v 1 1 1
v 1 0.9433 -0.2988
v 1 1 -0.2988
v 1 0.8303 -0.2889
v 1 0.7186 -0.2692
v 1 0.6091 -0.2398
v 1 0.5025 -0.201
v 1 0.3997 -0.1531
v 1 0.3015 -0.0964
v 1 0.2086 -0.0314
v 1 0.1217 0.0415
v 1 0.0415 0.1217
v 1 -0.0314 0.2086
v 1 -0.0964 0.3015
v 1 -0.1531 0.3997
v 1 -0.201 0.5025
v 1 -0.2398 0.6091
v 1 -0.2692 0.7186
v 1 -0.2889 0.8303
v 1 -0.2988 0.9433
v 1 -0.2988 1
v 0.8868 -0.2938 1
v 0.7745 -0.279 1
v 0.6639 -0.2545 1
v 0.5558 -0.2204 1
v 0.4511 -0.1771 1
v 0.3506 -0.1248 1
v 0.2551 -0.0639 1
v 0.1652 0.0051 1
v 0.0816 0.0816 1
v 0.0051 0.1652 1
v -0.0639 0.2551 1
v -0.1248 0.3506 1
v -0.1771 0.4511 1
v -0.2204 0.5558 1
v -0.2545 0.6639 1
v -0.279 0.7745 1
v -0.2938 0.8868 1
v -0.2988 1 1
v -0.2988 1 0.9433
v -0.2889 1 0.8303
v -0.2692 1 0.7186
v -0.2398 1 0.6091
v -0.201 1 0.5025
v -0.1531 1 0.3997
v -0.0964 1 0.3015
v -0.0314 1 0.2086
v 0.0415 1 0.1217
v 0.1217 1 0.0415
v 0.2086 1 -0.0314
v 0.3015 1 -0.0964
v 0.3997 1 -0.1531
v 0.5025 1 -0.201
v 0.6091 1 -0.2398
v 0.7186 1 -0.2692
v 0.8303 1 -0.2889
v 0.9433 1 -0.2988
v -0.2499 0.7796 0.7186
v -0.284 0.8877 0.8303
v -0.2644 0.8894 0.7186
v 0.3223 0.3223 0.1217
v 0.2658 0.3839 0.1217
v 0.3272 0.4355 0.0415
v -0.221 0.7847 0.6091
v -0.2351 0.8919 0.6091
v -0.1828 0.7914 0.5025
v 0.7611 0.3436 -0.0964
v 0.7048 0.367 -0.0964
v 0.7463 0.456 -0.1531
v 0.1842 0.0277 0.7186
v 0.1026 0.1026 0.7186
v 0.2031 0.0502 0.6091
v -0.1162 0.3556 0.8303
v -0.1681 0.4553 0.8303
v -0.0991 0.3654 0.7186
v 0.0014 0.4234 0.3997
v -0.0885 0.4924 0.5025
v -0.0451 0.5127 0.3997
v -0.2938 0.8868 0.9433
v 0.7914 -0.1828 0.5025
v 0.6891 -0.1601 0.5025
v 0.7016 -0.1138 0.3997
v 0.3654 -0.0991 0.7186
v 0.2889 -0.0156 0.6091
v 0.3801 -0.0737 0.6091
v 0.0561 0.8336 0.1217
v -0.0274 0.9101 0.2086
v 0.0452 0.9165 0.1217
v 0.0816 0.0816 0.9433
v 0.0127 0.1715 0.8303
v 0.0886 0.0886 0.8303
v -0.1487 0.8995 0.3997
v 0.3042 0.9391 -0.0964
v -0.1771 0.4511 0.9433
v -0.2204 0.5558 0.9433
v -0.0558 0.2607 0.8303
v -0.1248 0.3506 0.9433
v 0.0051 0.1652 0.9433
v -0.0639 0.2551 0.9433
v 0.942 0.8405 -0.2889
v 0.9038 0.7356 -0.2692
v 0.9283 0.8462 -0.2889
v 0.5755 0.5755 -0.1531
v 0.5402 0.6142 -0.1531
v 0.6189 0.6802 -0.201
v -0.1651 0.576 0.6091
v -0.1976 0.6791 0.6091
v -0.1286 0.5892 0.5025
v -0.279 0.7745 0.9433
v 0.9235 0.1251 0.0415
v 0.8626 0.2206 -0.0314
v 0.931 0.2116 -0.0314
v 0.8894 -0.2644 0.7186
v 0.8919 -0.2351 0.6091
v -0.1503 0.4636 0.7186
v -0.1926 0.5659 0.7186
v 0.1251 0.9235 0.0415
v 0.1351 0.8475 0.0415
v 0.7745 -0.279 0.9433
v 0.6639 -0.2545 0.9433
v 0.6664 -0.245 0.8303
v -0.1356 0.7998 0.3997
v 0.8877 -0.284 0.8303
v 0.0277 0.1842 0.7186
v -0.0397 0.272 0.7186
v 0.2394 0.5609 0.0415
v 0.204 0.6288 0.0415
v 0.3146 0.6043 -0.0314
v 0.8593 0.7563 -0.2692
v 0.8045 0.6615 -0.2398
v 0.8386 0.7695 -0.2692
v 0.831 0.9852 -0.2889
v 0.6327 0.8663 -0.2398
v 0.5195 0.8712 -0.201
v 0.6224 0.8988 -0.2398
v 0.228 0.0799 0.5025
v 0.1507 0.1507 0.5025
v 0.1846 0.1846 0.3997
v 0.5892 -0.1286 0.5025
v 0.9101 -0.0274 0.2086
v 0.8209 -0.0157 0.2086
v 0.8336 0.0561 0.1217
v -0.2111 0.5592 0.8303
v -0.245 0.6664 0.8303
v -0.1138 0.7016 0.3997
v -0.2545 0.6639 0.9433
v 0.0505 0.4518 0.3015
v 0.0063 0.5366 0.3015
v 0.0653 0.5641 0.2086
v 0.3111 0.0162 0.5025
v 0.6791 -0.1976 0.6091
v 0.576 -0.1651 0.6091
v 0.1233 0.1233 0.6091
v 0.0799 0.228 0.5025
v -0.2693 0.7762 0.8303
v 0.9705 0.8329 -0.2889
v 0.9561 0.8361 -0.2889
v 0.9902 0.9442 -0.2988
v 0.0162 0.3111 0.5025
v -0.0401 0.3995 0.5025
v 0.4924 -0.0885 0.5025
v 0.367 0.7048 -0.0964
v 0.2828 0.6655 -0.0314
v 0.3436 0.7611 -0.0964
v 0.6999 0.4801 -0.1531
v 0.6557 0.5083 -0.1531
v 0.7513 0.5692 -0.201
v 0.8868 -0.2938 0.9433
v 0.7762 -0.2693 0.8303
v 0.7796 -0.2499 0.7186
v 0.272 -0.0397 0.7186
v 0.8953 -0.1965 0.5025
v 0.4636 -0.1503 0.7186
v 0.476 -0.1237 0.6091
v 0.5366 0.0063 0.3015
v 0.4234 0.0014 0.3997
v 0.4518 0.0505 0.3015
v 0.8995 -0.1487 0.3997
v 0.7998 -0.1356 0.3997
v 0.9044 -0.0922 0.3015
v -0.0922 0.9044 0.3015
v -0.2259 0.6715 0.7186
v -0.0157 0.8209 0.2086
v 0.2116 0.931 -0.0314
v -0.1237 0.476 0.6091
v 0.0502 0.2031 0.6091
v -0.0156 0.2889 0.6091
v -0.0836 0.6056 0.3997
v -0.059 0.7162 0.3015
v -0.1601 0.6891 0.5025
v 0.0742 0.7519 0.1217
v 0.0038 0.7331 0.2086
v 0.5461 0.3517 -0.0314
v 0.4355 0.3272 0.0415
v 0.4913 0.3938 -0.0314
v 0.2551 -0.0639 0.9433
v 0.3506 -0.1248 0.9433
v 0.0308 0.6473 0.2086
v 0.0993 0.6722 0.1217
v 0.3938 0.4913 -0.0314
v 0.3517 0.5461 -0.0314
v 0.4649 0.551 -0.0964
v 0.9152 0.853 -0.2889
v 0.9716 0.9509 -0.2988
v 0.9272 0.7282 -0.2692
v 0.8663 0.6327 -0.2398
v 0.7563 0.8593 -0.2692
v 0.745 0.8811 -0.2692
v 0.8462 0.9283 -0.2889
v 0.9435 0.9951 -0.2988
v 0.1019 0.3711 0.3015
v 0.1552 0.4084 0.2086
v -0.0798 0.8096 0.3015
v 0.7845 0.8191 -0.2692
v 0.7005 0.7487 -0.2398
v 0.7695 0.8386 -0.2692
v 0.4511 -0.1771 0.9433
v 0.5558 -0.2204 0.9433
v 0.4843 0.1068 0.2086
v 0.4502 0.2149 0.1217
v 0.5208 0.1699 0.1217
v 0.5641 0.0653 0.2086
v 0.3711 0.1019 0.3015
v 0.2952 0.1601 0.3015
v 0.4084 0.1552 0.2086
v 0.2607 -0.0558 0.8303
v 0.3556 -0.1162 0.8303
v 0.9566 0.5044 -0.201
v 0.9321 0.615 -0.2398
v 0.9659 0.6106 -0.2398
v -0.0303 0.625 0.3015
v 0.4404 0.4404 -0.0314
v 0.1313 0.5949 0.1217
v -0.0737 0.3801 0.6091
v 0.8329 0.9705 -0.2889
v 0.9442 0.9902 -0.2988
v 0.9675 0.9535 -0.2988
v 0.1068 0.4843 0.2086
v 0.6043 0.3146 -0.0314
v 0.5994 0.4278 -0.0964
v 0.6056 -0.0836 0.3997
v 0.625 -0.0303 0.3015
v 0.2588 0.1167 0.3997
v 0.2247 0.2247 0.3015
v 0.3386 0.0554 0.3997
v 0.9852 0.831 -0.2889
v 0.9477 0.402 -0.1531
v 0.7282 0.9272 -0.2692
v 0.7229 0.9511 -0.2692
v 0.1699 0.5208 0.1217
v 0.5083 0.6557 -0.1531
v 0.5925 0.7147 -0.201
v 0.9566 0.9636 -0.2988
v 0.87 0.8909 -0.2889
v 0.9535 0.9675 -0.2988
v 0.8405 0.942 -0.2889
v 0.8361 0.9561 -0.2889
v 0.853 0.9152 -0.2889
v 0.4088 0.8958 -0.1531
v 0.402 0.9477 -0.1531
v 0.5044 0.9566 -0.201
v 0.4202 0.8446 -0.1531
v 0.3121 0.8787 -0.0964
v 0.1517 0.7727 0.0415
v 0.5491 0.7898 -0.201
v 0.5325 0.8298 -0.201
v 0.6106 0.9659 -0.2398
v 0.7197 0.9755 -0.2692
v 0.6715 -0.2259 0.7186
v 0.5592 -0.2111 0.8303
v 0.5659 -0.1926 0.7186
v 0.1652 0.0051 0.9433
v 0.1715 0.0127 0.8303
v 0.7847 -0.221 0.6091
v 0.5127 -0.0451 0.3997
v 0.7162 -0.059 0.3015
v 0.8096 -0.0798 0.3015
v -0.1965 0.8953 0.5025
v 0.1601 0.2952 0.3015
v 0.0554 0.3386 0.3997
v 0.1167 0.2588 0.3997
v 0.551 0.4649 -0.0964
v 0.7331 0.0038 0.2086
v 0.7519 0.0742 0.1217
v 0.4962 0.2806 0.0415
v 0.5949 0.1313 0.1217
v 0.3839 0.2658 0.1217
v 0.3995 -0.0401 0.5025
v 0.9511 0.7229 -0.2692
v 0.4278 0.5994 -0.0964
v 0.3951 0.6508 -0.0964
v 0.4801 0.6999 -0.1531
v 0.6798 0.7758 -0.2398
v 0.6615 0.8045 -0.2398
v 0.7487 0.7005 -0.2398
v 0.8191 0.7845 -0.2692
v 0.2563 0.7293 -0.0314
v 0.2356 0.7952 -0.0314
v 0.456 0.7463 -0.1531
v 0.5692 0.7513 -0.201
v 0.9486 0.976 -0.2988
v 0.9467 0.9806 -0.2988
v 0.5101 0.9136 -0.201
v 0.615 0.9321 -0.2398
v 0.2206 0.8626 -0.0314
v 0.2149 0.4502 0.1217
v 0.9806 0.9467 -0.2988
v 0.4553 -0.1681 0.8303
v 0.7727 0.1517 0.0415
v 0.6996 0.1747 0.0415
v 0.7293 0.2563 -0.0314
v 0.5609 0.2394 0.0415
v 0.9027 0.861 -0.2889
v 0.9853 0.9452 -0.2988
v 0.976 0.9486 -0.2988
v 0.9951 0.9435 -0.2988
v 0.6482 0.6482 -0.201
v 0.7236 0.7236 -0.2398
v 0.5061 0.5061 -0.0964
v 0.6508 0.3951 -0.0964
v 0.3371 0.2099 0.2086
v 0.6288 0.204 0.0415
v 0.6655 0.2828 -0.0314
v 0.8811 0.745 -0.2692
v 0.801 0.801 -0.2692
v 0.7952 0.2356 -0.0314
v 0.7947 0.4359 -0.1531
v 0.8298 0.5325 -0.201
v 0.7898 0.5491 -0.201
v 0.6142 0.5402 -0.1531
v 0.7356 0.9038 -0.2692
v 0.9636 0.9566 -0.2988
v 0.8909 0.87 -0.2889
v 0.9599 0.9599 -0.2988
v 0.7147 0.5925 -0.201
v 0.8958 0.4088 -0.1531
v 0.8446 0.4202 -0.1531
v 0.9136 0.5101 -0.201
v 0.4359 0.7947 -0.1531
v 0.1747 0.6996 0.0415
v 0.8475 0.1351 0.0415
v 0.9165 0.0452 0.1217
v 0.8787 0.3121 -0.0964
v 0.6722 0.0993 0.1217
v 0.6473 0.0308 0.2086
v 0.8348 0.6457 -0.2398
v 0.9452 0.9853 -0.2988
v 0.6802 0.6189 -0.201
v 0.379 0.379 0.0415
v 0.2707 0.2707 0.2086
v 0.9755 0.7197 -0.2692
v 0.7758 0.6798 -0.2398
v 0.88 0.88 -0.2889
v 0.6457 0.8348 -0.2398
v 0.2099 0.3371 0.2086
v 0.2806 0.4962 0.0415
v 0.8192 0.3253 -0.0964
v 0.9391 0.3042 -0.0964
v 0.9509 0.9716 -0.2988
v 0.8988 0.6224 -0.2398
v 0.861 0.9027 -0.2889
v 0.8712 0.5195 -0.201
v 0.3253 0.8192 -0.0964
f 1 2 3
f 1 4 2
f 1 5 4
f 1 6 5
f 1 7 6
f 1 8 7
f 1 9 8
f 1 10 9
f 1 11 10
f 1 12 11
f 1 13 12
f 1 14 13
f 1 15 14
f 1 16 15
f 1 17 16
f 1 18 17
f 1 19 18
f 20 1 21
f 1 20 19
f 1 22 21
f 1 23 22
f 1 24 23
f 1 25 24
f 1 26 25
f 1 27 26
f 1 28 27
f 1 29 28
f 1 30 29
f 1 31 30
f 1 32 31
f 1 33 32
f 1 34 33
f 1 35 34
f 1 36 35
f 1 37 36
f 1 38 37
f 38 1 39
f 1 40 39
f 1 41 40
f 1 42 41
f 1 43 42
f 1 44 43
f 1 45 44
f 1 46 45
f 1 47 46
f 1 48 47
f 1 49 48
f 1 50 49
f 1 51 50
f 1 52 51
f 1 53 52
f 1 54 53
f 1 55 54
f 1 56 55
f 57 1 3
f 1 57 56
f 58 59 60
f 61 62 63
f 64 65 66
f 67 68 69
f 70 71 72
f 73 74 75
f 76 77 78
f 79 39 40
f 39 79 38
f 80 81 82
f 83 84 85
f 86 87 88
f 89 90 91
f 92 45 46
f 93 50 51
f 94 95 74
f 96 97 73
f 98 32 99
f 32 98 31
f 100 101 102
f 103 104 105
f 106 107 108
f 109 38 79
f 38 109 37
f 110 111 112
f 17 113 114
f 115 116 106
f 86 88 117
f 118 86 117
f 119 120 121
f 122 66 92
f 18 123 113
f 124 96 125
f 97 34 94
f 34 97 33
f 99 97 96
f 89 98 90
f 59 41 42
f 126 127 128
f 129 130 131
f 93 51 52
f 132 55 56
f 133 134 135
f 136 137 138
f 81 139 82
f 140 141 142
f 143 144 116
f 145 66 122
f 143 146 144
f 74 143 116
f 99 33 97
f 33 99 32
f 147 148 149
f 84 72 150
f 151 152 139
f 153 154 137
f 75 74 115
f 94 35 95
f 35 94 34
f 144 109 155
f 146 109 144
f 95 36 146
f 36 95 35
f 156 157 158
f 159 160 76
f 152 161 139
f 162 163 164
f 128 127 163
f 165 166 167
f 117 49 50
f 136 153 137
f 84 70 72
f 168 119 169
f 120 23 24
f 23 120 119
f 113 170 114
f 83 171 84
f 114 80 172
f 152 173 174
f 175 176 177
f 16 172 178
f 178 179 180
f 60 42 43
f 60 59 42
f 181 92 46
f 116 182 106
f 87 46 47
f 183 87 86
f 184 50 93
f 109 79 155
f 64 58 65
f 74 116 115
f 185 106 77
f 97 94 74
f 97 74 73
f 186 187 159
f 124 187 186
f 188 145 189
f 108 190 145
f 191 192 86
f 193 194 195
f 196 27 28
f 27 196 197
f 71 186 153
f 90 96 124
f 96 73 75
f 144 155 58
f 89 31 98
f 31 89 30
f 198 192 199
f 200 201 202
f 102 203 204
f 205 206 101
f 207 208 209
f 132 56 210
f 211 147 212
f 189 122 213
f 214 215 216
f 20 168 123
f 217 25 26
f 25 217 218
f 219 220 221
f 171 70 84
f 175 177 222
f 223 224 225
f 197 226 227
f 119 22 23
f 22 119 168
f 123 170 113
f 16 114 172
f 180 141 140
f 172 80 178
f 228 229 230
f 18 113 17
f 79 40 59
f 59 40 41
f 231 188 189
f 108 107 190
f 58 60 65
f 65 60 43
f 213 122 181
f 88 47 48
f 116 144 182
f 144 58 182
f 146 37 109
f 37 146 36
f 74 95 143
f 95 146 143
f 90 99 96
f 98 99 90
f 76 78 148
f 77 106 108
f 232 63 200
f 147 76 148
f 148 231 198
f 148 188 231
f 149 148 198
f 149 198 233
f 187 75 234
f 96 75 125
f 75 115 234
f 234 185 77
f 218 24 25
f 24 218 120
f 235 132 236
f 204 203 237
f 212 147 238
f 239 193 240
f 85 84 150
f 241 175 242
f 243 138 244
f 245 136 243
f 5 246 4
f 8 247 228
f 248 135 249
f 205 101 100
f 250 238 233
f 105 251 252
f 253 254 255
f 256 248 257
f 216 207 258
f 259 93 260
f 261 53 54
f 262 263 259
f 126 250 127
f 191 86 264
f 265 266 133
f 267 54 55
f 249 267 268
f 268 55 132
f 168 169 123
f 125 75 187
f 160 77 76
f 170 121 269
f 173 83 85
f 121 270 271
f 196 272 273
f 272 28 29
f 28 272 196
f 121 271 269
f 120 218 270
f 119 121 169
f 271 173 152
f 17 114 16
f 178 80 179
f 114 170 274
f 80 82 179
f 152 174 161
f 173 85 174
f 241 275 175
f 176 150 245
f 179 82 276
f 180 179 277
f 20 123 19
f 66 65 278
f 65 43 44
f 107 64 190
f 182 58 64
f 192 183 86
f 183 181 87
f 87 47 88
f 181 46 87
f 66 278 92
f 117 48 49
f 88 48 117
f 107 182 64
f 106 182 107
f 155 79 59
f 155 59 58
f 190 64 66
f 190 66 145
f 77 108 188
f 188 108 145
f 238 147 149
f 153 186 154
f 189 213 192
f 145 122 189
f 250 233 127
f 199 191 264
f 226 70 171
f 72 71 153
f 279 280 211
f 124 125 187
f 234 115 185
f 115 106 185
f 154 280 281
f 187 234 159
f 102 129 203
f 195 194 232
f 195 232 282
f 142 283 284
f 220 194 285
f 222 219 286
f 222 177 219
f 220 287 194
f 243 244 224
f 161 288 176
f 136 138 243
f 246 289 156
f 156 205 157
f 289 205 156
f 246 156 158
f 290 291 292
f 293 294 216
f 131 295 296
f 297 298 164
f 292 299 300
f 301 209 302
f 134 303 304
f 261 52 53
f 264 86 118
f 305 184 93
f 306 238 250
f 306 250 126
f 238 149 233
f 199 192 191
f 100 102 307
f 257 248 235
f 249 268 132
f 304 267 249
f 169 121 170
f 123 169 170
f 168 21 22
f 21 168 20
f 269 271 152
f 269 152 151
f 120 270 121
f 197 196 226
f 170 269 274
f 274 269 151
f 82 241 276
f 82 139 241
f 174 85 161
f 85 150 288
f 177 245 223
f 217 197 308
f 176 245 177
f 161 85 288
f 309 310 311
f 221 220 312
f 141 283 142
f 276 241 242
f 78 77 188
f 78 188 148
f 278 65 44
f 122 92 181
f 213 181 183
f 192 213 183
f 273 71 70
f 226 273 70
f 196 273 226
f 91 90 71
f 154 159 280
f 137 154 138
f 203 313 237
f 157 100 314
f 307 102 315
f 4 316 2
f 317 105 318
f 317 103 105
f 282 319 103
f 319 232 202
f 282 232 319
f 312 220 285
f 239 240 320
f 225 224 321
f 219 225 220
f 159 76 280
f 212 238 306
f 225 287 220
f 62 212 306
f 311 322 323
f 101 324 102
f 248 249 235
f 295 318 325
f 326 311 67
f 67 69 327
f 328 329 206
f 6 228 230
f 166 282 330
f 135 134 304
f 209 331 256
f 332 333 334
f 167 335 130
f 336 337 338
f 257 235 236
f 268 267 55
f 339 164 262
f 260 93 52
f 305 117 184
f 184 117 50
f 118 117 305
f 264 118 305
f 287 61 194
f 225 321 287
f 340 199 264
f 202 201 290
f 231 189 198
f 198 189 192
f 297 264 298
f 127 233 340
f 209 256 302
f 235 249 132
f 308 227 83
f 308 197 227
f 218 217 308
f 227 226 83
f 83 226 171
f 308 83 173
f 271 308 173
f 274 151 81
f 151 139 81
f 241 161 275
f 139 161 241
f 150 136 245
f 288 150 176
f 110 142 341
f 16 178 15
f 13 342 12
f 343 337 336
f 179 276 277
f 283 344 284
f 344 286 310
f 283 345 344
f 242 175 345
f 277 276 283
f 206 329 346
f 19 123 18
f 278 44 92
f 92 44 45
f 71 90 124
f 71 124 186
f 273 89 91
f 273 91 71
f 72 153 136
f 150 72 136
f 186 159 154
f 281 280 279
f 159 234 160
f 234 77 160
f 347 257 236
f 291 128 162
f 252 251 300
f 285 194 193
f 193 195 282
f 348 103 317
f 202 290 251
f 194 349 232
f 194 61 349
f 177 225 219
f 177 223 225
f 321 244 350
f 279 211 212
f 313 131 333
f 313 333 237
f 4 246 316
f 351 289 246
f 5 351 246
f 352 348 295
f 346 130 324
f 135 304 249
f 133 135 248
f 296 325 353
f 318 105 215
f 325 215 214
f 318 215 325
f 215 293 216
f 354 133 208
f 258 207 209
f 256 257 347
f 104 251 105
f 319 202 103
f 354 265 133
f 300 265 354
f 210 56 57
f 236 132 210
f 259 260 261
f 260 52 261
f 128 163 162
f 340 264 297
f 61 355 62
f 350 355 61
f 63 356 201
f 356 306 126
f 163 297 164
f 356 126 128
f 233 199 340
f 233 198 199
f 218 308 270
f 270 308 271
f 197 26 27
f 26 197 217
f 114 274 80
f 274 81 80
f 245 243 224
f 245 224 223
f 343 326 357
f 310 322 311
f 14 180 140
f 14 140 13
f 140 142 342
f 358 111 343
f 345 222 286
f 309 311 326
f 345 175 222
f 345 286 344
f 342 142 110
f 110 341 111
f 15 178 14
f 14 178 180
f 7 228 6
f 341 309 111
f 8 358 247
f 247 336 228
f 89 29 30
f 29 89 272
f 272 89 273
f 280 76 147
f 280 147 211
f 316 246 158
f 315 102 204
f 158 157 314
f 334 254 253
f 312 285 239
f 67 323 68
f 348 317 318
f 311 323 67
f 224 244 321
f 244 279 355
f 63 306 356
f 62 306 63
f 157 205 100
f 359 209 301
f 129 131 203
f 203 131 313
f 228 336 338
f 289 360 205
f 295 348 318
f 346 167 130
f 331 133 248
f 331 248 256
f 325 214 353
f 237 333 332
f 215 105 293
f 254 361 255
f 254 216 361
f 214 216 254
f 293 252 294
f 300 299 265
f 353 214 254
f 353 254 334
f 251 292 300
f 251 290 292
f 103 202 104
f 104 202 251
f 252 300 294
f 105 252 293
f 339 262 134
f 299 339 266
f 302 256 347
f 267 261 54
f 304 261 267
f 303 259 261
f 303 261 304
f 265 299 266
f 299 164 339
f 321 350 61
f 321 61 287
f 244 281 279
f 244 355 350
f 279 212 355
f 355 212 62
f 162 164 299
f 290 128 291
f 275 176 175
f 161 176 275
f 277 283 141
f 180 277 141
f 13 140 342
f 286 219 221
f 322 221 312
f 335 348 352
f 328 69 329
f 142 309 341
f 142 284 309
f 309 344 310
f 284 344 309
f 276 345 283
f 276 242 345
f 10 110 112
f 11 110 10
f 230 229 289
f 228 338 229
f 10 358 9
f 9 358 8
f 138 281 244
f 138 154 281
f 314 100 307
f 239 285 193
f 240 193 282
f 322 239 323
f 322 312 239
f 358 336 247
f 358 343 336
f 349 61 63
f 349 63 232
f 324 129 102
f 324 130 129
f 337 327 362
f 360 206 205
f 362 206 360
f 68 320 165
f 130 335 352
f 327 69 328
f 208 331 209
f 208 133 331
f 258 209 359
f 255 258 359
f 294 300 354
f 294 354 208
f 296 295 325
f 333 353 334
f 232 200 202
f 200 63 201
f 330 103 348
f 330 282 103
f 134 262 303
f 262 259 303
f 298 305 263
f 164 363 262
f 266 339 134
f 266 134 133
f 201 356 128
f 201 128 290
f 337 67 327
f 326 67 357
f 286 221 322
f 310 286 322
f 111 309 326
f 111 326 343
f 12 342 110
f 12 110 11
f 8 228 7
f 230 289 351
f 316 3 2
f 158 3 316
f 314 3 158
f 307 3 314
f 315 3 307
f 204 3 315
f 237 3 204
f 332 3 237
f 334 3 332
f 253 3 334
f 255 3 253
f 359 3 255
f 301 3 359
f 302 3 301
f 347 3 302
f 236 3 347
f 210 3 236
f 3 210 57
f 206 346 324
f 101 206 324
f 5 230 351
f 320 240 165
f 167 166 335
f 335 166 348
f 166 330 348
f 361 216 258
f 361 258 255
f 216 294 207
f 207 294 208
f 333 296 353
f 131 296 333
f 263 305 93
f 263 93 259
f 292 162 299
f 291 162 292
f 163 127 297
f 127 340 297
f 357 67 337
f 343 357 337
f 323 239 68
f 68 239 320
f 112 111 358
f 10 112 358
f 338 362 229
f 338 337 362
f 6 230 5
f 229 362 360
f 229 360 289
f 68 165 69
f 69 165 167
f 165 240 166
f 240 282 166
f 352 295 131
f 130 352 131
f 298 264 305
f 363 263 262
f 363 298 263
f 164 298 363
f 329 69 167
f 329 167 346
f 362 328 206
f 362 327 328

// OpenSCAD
module Object1() {
     color([.9, .7, .8]) cube([2, 2, 2], center = true);
}
module Object2() {
     color([.8, .8, .9]) translate([1, 1, 1]) sphere(r = 1.3);
}
module Ghost() {
     color([1, 1, 1, .1]) children();
}

module UnionIcon() {
     union() {
          Object1();
          Object2();
     }
}

module IntersectionIcon() {
     intersection() {
          Object1();
          Object2();
     }
     //Ghost() { Object1(); }
     //Ghost() { Object2(); }
}

module DifferenceIcon() {
     difference() {
          Object1();
          Object2();
     }
     //Ghost() { Object2(); }
}

$fn = 72;
//UnionIcon();
IntersectionIcon();
//DifferenceIcon();
